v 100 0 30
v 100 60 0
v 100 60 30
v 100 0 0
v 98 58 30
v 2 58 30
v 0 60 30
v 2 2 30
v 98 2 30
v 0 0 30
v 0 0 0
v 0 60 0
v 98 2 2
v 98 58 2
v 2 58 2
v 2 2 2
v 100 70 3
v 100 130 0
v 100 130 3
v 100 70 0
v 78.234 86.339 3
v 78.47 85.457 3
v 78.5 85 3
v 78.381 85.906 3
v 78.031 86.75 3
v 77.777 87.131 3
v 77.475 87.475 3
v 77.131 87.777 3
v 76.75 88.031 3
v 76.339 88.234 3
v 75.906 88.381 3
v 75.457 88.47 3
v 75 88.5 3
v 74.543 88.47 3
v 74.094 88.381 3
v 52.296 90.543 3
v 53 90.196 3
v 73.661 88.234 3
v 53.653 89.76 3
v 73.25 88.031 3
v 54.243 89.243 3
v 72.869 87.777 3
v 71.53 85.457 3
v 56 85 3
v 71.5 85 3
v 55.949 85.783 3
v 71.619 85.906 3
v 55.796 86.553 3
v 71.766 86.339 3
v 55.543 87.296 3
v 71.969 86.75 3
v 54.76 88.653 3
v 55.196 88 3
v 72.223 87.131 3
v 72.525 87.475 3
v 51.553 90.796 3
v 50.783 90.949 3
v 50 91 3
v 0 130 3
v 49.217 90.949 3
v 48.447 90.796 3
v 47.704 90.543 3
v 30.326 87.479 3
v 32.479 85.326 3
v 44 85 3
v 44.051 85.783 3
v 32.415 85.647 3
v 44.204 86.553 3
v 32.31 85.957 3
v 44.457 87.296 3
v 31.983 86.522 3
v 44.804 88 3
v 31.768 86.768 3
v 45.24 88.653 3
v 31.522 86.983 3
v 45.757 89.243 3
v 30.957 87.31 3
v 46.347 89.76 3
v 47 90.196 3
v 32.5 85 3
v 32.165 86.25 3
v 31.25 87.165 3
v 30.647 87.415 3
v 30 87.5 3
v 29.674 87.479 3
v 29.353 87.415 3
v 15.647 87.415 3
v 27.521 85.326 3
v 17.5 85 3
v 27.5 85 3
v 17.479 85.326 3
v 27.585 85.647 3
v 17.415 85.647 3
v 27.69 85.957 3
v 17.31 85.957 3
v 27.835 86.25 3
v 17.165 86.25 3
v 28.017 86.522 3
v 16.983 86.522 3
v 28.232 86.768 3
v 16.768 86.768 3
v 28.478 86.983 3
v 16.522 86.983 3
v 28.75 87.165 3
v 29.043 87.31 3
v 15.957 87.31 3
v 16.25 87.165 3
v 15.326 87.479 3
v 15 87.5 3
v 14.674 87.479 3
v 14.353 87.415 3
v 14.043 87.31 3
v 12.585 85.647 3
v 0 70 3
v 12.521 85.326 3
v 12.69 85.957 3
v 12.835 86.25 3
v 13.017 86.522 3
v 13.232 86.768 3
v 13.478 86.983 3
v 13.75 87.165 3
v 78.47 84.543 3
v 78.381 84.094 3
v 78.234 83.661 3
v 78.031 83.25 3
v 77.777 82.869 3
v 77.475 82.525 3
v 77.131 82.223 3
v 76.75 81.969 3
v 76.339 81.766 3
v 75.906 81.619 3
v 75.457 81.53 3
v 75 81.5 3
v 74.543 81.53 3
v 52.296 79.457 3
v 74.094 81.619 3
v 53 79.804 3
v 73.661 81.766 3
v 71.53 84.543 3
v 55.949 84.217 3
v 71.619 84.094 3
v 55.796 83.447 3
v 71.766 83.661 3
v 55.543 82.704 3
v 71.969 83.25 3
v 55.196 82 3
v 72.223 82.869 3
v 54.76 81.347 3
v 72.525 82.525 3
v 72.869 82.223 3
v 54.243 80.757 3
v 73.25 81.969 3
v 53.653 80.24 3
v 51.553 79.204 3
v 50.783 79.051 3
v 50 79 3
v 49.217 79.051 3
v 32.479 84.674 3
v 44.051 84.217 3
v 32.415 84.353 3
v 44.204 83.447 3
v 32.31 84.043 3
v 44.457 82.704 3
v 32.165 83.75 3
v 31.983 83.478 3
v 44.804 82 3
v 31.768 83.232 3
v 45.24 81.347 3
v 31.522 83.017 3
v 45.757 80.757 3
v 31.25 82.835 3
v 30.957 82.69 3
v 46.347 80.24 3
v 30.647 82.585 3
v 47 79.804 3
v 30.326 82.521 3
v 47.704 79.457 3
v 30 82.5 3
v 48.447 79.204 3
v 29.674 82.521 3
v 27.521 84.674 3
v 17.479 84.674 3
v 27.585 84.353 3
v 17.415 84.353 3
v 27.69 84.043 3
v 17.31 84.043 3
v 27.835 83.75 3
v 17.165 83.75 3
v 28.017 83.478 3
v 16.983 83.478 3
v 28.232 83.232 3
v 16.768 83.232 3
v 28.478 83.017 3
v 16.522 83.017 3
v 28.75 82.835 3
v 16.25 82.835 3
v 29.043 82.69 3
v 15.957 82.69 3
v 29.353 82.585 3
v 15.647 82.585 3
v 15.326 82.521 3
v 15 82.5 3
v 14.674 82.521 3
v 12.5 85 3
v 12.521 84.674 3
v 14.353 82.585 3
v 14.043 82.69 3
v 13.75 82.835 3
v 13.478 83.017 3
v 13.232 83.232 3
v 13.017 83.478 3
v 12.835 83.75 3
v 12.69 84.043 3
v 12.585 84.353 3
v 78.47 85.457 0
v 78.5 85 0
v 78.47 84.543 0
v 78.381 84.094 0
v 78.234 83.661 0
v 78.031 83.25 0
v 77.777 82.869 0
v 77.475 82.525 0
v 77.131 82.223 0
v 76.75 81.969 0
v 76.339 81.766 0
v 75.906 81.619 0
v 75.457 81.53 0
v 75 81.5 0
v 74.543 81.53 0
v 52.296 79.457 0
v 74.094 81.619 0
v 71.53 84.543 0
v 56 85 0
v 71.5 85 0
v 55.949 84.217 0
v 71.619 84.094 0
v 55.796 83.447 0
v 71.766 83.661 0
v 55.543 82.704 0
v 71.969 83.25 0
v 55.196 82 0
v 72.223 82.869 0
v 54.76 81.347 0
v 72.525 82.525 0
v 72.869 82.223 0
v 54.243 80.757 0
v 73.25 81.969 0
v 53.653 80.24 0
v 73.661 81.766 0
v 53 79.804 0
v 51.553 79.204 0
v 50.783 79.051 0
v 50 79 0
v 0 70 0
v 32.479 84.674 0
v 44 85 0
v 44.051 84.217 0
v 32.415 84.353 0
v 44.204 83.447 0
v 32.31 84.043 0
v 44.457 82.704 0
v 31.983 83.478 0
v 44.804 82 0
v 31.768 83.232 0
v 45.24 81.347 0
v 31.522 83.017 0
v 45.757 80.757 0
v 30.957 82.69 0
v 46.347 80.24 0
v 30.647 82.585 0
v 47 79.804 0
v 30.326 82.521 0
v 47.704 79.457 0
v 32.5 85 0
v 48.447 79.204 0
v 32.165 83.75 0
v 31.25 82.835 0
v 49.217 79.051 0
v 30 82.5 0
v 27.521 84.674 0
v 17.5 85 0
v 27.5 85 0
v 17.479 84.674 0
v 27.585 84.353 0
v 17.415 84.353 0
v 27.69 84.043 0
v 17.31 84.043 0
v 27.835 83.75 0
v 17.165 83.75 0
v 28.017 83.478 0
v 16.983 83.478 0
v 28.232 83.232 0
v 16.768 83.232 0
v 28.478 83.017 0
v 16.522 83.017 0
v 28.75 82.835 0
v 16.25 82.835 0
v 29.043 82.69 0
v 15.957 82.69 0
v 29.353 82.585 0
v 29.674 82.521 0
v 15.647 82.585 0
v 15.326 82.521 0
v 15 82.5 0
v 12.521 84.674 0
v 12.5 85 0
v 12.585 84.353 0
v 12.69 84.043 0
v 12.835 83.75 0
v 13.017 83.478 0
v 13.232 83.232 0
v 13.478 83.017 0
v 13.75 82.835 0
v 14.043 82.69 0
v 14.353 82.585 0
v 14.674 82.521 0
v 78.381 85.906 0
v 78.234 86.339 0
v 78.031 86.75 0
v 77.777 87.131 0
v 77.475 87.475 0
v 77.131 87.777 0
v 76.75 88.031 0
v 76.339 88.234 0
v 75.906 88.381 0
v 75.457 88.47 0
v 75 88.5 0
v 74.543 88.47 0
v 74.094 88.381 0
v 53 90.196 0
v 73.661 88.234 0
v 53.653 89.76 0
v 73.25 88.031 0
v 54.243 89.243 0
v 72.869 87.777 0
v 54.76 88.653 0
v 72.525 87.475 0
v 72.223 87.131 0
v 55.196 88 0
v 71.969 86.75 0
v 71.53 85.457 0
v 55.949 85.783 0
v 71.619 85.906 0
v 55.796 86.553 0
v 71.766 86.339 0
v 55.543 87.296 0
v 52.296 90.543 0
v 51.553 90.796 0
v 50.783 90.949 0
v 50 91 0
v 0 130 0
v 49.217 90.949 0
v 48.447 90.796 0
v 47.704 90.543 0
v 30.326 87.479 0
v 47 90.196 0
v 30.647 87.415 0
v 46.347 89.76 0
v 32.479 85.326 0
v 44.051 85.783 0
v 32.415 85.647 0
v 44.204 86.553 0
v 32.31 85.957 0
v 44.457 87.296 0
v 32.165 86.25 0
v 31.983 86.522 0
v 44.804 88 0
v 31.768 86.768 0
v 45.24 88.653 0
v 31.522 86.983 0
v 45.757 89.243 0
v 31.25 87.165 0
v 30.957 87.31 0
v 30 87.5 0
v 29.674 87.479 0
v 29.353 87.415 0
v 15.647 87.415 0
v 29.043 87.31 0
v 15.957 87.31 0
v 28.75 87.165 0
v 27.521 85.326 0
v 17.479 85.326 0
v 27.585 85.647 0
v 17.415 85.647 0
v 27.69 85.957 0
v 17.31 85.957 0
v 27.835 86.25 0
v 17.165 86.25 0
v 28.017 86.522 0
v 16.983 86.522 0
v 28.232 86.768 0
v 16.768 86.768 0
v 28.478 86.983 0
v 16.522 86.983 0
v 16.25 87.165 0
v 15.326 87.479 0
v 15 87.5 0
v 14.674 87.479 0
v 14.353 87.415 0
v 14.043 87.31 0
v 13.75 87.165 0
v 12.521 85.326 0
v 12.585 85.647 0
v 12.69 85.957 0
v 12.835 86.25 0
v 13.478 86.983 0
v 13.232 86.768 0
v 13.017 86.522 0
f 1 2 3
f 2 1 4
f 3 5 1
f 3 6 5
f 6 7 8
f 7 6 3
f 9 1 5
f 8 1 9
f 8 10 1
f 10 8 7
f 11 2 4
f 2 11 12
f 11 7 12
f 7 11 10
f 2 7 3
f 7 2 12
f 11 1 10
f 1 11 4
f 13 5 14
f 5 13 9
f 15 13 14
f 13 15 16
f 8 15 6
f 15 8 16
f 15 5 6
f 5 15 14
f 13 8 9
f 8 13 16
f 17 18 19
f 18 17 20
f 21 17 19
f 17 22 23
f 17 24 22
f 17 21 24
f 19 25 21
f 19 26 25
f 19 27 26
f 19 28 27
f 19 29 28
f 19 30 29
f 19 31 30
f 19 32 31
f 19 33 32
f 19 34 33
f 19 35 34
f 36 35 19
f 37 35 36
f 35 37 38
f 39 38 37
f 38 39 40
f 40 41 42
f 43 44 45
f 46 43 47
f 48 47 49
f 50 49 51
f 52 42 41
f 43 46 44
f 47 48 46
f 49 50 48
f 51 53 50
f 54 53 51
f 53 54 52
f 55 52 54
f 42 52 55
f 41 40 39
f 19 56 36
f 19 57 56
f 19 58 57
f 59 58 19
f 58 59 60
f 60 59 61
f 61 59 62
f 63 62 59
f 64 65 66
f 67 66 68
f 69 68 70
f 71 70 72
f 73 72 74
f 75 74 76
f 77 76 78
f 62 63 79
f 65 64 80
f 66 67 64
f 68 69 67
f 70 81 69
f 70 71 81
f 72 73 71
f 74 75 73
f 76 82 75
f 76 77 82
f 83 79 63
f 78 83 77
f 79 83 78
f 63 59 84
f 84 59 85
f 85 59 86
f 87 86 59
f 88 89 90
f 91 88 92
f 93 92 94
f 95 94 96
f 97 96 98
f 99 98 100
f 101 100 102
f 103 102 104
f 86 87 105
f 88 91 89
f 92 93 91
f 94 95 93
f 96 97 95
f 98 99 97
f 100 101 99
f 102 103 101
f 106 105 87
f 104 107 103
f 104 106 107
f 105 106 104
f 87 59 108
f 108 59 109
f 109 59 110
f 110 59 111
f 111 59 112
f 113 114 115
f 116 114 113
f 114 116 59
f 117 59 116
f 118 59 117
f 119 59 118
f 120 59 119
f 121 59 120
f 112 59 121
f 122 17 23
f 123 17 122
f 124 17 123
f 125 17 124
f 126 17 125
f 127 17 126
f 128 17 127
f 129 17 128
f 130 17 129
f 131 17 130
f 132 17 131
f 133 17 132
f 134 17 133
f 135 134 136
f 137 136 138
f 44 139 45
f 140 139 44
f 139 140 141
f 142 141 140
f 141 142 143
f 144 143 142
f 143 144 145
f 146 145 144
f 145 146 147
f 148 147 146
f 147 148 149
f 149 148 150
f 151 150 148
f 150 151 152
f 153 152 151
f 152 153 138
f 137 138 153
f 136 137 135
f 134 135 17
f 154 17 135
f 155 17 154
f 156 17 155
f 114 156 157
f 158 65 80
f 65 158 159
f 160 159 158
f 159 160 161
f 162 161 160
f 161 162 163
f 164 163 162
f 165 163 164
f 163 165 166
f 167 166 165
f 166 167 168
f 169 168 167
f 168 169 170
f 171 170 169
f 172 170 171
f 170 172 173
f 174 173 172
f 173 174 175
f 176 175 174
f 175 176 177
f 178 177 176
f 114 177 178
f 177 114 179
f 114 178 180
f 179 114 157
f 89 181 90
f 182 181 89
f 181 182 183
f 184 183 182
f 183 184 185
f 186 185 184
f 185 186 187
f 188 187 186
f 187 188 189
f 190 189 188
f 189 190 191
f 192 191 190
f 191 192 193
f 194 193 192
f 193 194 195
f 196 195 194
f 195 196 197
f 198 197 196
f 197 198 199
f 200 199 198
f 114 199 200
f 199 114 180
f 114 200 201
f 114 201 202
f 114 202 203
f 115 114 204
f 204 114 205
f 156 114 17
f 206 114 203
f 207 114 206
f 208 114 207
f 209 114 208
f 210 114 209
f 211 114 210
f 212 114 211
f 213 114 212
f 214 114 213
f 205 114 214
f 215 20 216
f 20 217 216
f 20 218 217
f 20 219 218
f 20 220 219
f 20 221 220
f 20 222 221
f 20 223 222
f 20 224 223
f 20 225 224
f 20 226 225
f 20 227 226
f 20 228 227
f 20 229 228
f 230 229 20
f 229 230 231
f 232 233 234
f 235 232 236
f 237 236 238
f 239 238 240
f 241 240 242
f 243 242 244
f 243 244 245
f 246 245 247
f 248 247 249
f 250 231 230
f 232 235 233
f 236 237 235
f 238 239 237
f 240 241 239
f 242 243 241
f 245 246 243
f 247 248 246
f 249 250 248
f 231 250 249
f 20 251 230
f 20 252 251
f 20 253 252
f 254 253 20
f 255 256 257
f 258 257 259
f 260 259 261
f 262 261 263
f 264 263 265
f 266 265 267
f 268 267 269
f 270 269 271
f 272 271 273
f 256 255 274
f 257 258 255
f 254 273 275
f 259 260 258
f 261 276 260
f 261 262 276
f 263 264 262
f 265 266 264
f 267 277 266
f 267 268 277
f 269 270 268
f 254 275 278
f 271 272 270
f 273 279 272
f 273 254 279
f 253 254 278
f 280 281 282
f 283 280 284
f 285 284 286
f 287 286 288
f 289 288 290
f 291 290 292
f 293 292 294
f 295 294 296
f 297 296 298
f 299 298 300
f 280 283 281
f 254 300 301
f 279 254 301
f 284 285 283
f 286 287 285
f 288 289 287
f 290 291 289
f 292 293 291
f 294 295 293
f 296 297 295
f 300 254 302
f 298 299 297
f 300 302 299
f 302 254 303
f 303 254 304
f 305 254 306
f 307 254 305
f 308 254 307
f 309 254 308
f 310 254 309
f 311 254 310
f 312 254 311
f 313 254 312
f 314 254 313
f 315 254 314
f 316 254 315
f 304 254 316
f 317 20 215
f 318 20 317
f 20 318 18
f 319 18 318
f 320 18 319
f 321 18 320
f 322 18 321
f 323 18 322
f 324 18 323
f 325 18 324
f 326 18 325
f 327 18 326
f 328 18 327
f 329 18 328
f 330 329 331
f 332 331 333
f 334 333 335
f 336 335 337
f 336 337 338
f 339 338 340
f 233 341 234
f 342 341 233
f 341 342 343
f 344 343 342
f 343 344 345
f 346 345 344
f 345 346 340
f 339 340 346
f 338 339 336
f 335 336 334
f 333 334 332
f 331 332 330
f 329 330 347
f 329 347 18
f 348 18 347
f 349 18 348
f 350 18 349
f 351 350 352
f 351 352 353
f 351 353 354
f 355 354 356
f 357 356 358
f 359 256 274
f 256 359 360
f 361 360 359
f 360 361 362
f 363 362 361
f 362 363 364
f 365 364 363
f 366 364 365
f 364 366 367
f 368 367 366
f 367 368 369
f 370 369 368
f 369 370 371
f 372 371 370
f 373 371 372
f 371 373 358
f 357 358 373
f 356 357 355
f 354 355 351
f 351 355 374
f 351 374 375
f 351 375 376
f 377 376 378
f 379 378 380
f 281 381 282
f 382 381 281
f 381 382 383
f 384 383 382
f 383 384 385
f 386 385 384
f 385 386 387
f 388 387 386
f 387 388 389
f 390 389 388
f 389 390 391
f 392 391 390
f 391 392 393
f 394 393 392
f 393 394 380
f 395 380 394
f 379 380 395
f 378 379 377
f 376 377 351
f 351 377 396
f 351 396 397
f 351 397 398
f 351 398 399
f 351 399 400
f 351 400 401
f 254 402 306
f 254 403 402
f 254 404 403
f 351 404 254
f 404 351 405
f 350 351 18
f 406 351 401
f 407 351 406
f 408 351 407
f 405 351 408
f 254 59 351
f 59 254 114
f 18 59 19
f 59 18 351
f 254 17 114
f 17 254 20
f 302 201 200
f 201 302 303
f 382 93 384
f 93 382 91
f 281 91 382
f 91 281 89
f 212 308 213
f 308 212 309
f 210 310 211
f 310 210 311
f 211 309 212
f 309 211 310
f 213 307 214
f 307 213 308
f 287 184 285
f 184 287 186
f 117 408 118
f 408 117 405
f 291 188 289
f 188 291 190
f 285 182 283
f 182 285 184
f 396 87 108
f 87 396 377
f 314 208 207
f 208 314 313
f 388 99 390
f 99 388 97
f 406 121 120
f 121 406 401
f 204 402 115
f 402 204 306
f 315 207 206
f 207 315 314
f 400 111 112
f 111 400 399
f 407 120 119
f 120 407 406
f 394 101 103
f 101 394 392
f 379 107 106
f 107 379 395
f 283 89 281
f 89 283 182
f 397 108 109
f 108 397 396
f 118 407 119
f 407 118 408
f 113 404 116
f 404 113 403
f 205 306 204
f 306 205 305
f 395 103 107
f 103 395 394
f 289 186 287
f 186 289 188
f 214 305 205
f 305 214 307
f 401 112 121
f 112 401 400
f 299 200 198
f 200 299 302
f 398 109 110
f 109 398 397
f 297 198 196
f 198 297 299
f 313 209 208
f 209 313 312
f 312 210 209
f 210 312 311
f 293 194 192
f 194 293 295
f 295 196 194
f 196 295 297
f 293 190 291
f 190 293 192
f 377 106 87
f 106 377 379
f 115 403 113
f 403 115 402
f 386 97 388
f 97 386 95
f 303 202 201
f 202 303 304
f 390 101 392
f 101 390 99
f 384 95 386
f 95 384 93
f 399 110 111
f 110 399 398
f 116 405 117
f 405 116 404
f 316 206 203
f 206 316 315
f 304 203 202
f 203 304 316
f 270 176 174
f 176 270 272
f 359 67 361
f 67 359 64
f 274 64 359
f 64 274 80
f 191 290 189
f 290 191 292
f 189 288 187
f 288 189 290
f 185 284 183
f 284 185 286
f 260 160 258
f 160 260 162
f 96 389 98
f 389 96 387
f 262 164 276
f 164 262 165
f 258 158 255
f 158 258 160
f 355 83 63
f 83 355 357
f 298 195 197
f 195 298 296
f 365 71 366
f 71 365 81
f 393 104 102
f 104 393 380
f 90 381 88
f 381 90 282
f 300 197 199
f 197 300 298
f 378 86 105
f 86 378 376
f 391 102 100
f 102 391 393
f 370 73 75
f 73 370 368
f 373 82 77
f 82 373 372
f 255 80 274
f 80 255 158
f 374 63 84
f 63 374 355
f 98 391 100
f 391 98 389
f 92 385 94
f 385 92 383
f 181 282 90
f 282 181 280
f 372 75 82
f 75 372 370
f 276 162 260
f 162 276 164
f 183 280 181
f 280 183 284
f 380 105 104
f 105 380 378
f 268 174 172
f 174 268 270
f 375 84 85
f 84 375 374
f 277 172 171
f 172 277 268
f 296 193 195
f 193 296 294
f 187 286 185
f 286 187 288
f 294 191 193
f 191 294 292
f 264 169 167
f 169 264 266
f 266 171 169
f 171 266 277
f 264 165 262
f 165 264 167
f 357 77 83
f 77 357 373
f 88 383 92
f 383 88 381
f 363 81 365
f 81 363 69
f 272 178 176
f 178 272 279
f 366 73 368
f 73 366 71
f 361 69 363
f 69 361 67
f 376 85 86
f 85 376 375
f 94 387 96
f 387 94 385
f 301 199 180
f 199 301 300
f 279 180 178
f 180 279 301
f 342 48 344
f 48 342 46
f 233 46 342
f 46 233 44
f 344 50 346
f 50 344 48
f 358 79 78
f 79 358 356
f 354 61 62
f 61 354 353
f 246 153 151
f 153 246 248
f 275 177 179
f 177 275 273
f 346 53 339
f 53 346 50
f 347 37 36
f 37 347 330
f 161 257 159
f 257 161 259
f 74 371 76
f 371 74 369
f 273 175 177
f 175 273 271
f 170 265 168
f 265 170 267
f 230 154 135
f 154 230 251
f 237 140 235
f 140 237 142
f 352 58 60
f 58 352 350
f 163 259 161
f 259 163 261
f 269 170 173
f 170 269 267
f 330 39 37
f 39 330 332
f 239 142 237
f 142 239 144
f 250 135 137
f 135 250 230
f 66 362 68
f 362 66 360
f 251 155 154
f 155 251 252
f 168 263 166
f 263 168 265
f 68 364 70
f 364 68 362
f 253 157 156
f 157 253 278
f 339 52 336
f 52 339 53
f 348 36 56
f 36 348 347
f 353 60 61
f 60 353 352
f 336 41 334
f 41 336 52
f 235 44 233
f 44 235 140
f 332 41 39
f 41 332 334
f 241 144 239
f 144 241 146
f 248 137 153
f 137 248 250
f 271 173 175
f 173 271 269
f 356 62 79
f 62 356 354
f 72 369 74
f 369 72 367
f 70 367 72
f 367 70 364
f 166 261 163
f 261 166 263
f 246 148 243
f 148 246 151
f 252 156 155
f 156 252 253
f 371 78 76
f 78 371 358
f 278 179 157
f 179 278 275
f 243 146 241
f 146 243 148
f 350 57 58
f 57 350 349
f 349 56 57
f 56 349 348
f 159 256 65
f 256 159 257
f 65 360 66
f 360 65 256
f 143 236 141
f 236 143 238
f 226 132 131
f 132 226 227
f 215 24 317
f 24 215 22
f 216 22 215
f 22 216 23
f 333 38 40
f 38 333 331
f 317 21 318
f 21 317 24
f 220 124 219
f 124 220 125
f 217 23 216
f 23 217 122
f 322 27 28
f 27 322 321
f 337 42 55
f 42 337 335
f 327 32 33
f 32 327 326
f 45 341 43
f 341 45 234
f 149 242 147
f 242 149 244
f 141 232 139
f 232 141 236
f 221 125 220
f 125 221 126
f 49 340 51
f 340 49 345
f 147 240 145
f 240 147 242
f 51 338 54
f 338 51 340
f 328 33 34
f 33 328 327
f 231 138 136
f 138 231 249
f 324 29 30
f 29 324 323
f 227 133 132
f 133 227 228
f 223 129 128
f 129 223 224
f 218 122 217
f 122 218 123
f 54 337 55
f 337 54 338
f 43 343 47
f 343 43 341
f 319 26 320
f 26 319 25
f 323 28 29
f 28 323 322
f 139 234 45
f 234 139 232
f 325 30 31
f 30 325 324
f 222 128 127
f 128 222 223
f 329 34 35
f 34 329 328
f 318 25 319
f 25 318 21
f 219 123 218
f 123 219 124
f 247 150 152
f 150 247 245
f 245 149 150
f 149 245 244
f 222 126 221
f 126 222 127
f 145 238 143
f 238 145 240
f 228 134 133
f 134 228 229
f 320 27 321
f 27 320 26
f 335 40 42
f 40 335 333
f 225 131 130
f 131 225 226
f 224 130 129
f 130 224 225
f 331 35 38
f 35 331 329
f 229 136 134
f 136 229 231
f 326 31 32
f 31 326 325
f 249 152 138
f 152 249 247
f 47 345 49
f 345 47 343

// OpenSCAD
// ESPHome Boiler Monitor enclosure - printable concept
// Units: mm
$fn = 48;
box_w = 100; box_h = 60; box_d = 30; wall = 2;

module base_box() {
  difference() {
    cube([box_w, box_h, box_d]);
    translate([wall, wall, wall]) cube([box_w-2*wall, box_h-2*wall, box_d]);
  }
}

module lid() {
  difference() {
    cube([box_w, box_h, 3]);
    translate([15, 15, -1]) cylinder(h=6, d=5);   // red LED
    translate([30, 15, -1]) cylinder(h=6, d=5);   // green LED
    translate([50, 15, -1]) cylinder(h=6, d=12);  // buzzer
    translate([75, 15, -1]) cylinder(h=6, d=7);   // mute button
  }
}

base_box();
translate([0, 70, 0]) lid();
